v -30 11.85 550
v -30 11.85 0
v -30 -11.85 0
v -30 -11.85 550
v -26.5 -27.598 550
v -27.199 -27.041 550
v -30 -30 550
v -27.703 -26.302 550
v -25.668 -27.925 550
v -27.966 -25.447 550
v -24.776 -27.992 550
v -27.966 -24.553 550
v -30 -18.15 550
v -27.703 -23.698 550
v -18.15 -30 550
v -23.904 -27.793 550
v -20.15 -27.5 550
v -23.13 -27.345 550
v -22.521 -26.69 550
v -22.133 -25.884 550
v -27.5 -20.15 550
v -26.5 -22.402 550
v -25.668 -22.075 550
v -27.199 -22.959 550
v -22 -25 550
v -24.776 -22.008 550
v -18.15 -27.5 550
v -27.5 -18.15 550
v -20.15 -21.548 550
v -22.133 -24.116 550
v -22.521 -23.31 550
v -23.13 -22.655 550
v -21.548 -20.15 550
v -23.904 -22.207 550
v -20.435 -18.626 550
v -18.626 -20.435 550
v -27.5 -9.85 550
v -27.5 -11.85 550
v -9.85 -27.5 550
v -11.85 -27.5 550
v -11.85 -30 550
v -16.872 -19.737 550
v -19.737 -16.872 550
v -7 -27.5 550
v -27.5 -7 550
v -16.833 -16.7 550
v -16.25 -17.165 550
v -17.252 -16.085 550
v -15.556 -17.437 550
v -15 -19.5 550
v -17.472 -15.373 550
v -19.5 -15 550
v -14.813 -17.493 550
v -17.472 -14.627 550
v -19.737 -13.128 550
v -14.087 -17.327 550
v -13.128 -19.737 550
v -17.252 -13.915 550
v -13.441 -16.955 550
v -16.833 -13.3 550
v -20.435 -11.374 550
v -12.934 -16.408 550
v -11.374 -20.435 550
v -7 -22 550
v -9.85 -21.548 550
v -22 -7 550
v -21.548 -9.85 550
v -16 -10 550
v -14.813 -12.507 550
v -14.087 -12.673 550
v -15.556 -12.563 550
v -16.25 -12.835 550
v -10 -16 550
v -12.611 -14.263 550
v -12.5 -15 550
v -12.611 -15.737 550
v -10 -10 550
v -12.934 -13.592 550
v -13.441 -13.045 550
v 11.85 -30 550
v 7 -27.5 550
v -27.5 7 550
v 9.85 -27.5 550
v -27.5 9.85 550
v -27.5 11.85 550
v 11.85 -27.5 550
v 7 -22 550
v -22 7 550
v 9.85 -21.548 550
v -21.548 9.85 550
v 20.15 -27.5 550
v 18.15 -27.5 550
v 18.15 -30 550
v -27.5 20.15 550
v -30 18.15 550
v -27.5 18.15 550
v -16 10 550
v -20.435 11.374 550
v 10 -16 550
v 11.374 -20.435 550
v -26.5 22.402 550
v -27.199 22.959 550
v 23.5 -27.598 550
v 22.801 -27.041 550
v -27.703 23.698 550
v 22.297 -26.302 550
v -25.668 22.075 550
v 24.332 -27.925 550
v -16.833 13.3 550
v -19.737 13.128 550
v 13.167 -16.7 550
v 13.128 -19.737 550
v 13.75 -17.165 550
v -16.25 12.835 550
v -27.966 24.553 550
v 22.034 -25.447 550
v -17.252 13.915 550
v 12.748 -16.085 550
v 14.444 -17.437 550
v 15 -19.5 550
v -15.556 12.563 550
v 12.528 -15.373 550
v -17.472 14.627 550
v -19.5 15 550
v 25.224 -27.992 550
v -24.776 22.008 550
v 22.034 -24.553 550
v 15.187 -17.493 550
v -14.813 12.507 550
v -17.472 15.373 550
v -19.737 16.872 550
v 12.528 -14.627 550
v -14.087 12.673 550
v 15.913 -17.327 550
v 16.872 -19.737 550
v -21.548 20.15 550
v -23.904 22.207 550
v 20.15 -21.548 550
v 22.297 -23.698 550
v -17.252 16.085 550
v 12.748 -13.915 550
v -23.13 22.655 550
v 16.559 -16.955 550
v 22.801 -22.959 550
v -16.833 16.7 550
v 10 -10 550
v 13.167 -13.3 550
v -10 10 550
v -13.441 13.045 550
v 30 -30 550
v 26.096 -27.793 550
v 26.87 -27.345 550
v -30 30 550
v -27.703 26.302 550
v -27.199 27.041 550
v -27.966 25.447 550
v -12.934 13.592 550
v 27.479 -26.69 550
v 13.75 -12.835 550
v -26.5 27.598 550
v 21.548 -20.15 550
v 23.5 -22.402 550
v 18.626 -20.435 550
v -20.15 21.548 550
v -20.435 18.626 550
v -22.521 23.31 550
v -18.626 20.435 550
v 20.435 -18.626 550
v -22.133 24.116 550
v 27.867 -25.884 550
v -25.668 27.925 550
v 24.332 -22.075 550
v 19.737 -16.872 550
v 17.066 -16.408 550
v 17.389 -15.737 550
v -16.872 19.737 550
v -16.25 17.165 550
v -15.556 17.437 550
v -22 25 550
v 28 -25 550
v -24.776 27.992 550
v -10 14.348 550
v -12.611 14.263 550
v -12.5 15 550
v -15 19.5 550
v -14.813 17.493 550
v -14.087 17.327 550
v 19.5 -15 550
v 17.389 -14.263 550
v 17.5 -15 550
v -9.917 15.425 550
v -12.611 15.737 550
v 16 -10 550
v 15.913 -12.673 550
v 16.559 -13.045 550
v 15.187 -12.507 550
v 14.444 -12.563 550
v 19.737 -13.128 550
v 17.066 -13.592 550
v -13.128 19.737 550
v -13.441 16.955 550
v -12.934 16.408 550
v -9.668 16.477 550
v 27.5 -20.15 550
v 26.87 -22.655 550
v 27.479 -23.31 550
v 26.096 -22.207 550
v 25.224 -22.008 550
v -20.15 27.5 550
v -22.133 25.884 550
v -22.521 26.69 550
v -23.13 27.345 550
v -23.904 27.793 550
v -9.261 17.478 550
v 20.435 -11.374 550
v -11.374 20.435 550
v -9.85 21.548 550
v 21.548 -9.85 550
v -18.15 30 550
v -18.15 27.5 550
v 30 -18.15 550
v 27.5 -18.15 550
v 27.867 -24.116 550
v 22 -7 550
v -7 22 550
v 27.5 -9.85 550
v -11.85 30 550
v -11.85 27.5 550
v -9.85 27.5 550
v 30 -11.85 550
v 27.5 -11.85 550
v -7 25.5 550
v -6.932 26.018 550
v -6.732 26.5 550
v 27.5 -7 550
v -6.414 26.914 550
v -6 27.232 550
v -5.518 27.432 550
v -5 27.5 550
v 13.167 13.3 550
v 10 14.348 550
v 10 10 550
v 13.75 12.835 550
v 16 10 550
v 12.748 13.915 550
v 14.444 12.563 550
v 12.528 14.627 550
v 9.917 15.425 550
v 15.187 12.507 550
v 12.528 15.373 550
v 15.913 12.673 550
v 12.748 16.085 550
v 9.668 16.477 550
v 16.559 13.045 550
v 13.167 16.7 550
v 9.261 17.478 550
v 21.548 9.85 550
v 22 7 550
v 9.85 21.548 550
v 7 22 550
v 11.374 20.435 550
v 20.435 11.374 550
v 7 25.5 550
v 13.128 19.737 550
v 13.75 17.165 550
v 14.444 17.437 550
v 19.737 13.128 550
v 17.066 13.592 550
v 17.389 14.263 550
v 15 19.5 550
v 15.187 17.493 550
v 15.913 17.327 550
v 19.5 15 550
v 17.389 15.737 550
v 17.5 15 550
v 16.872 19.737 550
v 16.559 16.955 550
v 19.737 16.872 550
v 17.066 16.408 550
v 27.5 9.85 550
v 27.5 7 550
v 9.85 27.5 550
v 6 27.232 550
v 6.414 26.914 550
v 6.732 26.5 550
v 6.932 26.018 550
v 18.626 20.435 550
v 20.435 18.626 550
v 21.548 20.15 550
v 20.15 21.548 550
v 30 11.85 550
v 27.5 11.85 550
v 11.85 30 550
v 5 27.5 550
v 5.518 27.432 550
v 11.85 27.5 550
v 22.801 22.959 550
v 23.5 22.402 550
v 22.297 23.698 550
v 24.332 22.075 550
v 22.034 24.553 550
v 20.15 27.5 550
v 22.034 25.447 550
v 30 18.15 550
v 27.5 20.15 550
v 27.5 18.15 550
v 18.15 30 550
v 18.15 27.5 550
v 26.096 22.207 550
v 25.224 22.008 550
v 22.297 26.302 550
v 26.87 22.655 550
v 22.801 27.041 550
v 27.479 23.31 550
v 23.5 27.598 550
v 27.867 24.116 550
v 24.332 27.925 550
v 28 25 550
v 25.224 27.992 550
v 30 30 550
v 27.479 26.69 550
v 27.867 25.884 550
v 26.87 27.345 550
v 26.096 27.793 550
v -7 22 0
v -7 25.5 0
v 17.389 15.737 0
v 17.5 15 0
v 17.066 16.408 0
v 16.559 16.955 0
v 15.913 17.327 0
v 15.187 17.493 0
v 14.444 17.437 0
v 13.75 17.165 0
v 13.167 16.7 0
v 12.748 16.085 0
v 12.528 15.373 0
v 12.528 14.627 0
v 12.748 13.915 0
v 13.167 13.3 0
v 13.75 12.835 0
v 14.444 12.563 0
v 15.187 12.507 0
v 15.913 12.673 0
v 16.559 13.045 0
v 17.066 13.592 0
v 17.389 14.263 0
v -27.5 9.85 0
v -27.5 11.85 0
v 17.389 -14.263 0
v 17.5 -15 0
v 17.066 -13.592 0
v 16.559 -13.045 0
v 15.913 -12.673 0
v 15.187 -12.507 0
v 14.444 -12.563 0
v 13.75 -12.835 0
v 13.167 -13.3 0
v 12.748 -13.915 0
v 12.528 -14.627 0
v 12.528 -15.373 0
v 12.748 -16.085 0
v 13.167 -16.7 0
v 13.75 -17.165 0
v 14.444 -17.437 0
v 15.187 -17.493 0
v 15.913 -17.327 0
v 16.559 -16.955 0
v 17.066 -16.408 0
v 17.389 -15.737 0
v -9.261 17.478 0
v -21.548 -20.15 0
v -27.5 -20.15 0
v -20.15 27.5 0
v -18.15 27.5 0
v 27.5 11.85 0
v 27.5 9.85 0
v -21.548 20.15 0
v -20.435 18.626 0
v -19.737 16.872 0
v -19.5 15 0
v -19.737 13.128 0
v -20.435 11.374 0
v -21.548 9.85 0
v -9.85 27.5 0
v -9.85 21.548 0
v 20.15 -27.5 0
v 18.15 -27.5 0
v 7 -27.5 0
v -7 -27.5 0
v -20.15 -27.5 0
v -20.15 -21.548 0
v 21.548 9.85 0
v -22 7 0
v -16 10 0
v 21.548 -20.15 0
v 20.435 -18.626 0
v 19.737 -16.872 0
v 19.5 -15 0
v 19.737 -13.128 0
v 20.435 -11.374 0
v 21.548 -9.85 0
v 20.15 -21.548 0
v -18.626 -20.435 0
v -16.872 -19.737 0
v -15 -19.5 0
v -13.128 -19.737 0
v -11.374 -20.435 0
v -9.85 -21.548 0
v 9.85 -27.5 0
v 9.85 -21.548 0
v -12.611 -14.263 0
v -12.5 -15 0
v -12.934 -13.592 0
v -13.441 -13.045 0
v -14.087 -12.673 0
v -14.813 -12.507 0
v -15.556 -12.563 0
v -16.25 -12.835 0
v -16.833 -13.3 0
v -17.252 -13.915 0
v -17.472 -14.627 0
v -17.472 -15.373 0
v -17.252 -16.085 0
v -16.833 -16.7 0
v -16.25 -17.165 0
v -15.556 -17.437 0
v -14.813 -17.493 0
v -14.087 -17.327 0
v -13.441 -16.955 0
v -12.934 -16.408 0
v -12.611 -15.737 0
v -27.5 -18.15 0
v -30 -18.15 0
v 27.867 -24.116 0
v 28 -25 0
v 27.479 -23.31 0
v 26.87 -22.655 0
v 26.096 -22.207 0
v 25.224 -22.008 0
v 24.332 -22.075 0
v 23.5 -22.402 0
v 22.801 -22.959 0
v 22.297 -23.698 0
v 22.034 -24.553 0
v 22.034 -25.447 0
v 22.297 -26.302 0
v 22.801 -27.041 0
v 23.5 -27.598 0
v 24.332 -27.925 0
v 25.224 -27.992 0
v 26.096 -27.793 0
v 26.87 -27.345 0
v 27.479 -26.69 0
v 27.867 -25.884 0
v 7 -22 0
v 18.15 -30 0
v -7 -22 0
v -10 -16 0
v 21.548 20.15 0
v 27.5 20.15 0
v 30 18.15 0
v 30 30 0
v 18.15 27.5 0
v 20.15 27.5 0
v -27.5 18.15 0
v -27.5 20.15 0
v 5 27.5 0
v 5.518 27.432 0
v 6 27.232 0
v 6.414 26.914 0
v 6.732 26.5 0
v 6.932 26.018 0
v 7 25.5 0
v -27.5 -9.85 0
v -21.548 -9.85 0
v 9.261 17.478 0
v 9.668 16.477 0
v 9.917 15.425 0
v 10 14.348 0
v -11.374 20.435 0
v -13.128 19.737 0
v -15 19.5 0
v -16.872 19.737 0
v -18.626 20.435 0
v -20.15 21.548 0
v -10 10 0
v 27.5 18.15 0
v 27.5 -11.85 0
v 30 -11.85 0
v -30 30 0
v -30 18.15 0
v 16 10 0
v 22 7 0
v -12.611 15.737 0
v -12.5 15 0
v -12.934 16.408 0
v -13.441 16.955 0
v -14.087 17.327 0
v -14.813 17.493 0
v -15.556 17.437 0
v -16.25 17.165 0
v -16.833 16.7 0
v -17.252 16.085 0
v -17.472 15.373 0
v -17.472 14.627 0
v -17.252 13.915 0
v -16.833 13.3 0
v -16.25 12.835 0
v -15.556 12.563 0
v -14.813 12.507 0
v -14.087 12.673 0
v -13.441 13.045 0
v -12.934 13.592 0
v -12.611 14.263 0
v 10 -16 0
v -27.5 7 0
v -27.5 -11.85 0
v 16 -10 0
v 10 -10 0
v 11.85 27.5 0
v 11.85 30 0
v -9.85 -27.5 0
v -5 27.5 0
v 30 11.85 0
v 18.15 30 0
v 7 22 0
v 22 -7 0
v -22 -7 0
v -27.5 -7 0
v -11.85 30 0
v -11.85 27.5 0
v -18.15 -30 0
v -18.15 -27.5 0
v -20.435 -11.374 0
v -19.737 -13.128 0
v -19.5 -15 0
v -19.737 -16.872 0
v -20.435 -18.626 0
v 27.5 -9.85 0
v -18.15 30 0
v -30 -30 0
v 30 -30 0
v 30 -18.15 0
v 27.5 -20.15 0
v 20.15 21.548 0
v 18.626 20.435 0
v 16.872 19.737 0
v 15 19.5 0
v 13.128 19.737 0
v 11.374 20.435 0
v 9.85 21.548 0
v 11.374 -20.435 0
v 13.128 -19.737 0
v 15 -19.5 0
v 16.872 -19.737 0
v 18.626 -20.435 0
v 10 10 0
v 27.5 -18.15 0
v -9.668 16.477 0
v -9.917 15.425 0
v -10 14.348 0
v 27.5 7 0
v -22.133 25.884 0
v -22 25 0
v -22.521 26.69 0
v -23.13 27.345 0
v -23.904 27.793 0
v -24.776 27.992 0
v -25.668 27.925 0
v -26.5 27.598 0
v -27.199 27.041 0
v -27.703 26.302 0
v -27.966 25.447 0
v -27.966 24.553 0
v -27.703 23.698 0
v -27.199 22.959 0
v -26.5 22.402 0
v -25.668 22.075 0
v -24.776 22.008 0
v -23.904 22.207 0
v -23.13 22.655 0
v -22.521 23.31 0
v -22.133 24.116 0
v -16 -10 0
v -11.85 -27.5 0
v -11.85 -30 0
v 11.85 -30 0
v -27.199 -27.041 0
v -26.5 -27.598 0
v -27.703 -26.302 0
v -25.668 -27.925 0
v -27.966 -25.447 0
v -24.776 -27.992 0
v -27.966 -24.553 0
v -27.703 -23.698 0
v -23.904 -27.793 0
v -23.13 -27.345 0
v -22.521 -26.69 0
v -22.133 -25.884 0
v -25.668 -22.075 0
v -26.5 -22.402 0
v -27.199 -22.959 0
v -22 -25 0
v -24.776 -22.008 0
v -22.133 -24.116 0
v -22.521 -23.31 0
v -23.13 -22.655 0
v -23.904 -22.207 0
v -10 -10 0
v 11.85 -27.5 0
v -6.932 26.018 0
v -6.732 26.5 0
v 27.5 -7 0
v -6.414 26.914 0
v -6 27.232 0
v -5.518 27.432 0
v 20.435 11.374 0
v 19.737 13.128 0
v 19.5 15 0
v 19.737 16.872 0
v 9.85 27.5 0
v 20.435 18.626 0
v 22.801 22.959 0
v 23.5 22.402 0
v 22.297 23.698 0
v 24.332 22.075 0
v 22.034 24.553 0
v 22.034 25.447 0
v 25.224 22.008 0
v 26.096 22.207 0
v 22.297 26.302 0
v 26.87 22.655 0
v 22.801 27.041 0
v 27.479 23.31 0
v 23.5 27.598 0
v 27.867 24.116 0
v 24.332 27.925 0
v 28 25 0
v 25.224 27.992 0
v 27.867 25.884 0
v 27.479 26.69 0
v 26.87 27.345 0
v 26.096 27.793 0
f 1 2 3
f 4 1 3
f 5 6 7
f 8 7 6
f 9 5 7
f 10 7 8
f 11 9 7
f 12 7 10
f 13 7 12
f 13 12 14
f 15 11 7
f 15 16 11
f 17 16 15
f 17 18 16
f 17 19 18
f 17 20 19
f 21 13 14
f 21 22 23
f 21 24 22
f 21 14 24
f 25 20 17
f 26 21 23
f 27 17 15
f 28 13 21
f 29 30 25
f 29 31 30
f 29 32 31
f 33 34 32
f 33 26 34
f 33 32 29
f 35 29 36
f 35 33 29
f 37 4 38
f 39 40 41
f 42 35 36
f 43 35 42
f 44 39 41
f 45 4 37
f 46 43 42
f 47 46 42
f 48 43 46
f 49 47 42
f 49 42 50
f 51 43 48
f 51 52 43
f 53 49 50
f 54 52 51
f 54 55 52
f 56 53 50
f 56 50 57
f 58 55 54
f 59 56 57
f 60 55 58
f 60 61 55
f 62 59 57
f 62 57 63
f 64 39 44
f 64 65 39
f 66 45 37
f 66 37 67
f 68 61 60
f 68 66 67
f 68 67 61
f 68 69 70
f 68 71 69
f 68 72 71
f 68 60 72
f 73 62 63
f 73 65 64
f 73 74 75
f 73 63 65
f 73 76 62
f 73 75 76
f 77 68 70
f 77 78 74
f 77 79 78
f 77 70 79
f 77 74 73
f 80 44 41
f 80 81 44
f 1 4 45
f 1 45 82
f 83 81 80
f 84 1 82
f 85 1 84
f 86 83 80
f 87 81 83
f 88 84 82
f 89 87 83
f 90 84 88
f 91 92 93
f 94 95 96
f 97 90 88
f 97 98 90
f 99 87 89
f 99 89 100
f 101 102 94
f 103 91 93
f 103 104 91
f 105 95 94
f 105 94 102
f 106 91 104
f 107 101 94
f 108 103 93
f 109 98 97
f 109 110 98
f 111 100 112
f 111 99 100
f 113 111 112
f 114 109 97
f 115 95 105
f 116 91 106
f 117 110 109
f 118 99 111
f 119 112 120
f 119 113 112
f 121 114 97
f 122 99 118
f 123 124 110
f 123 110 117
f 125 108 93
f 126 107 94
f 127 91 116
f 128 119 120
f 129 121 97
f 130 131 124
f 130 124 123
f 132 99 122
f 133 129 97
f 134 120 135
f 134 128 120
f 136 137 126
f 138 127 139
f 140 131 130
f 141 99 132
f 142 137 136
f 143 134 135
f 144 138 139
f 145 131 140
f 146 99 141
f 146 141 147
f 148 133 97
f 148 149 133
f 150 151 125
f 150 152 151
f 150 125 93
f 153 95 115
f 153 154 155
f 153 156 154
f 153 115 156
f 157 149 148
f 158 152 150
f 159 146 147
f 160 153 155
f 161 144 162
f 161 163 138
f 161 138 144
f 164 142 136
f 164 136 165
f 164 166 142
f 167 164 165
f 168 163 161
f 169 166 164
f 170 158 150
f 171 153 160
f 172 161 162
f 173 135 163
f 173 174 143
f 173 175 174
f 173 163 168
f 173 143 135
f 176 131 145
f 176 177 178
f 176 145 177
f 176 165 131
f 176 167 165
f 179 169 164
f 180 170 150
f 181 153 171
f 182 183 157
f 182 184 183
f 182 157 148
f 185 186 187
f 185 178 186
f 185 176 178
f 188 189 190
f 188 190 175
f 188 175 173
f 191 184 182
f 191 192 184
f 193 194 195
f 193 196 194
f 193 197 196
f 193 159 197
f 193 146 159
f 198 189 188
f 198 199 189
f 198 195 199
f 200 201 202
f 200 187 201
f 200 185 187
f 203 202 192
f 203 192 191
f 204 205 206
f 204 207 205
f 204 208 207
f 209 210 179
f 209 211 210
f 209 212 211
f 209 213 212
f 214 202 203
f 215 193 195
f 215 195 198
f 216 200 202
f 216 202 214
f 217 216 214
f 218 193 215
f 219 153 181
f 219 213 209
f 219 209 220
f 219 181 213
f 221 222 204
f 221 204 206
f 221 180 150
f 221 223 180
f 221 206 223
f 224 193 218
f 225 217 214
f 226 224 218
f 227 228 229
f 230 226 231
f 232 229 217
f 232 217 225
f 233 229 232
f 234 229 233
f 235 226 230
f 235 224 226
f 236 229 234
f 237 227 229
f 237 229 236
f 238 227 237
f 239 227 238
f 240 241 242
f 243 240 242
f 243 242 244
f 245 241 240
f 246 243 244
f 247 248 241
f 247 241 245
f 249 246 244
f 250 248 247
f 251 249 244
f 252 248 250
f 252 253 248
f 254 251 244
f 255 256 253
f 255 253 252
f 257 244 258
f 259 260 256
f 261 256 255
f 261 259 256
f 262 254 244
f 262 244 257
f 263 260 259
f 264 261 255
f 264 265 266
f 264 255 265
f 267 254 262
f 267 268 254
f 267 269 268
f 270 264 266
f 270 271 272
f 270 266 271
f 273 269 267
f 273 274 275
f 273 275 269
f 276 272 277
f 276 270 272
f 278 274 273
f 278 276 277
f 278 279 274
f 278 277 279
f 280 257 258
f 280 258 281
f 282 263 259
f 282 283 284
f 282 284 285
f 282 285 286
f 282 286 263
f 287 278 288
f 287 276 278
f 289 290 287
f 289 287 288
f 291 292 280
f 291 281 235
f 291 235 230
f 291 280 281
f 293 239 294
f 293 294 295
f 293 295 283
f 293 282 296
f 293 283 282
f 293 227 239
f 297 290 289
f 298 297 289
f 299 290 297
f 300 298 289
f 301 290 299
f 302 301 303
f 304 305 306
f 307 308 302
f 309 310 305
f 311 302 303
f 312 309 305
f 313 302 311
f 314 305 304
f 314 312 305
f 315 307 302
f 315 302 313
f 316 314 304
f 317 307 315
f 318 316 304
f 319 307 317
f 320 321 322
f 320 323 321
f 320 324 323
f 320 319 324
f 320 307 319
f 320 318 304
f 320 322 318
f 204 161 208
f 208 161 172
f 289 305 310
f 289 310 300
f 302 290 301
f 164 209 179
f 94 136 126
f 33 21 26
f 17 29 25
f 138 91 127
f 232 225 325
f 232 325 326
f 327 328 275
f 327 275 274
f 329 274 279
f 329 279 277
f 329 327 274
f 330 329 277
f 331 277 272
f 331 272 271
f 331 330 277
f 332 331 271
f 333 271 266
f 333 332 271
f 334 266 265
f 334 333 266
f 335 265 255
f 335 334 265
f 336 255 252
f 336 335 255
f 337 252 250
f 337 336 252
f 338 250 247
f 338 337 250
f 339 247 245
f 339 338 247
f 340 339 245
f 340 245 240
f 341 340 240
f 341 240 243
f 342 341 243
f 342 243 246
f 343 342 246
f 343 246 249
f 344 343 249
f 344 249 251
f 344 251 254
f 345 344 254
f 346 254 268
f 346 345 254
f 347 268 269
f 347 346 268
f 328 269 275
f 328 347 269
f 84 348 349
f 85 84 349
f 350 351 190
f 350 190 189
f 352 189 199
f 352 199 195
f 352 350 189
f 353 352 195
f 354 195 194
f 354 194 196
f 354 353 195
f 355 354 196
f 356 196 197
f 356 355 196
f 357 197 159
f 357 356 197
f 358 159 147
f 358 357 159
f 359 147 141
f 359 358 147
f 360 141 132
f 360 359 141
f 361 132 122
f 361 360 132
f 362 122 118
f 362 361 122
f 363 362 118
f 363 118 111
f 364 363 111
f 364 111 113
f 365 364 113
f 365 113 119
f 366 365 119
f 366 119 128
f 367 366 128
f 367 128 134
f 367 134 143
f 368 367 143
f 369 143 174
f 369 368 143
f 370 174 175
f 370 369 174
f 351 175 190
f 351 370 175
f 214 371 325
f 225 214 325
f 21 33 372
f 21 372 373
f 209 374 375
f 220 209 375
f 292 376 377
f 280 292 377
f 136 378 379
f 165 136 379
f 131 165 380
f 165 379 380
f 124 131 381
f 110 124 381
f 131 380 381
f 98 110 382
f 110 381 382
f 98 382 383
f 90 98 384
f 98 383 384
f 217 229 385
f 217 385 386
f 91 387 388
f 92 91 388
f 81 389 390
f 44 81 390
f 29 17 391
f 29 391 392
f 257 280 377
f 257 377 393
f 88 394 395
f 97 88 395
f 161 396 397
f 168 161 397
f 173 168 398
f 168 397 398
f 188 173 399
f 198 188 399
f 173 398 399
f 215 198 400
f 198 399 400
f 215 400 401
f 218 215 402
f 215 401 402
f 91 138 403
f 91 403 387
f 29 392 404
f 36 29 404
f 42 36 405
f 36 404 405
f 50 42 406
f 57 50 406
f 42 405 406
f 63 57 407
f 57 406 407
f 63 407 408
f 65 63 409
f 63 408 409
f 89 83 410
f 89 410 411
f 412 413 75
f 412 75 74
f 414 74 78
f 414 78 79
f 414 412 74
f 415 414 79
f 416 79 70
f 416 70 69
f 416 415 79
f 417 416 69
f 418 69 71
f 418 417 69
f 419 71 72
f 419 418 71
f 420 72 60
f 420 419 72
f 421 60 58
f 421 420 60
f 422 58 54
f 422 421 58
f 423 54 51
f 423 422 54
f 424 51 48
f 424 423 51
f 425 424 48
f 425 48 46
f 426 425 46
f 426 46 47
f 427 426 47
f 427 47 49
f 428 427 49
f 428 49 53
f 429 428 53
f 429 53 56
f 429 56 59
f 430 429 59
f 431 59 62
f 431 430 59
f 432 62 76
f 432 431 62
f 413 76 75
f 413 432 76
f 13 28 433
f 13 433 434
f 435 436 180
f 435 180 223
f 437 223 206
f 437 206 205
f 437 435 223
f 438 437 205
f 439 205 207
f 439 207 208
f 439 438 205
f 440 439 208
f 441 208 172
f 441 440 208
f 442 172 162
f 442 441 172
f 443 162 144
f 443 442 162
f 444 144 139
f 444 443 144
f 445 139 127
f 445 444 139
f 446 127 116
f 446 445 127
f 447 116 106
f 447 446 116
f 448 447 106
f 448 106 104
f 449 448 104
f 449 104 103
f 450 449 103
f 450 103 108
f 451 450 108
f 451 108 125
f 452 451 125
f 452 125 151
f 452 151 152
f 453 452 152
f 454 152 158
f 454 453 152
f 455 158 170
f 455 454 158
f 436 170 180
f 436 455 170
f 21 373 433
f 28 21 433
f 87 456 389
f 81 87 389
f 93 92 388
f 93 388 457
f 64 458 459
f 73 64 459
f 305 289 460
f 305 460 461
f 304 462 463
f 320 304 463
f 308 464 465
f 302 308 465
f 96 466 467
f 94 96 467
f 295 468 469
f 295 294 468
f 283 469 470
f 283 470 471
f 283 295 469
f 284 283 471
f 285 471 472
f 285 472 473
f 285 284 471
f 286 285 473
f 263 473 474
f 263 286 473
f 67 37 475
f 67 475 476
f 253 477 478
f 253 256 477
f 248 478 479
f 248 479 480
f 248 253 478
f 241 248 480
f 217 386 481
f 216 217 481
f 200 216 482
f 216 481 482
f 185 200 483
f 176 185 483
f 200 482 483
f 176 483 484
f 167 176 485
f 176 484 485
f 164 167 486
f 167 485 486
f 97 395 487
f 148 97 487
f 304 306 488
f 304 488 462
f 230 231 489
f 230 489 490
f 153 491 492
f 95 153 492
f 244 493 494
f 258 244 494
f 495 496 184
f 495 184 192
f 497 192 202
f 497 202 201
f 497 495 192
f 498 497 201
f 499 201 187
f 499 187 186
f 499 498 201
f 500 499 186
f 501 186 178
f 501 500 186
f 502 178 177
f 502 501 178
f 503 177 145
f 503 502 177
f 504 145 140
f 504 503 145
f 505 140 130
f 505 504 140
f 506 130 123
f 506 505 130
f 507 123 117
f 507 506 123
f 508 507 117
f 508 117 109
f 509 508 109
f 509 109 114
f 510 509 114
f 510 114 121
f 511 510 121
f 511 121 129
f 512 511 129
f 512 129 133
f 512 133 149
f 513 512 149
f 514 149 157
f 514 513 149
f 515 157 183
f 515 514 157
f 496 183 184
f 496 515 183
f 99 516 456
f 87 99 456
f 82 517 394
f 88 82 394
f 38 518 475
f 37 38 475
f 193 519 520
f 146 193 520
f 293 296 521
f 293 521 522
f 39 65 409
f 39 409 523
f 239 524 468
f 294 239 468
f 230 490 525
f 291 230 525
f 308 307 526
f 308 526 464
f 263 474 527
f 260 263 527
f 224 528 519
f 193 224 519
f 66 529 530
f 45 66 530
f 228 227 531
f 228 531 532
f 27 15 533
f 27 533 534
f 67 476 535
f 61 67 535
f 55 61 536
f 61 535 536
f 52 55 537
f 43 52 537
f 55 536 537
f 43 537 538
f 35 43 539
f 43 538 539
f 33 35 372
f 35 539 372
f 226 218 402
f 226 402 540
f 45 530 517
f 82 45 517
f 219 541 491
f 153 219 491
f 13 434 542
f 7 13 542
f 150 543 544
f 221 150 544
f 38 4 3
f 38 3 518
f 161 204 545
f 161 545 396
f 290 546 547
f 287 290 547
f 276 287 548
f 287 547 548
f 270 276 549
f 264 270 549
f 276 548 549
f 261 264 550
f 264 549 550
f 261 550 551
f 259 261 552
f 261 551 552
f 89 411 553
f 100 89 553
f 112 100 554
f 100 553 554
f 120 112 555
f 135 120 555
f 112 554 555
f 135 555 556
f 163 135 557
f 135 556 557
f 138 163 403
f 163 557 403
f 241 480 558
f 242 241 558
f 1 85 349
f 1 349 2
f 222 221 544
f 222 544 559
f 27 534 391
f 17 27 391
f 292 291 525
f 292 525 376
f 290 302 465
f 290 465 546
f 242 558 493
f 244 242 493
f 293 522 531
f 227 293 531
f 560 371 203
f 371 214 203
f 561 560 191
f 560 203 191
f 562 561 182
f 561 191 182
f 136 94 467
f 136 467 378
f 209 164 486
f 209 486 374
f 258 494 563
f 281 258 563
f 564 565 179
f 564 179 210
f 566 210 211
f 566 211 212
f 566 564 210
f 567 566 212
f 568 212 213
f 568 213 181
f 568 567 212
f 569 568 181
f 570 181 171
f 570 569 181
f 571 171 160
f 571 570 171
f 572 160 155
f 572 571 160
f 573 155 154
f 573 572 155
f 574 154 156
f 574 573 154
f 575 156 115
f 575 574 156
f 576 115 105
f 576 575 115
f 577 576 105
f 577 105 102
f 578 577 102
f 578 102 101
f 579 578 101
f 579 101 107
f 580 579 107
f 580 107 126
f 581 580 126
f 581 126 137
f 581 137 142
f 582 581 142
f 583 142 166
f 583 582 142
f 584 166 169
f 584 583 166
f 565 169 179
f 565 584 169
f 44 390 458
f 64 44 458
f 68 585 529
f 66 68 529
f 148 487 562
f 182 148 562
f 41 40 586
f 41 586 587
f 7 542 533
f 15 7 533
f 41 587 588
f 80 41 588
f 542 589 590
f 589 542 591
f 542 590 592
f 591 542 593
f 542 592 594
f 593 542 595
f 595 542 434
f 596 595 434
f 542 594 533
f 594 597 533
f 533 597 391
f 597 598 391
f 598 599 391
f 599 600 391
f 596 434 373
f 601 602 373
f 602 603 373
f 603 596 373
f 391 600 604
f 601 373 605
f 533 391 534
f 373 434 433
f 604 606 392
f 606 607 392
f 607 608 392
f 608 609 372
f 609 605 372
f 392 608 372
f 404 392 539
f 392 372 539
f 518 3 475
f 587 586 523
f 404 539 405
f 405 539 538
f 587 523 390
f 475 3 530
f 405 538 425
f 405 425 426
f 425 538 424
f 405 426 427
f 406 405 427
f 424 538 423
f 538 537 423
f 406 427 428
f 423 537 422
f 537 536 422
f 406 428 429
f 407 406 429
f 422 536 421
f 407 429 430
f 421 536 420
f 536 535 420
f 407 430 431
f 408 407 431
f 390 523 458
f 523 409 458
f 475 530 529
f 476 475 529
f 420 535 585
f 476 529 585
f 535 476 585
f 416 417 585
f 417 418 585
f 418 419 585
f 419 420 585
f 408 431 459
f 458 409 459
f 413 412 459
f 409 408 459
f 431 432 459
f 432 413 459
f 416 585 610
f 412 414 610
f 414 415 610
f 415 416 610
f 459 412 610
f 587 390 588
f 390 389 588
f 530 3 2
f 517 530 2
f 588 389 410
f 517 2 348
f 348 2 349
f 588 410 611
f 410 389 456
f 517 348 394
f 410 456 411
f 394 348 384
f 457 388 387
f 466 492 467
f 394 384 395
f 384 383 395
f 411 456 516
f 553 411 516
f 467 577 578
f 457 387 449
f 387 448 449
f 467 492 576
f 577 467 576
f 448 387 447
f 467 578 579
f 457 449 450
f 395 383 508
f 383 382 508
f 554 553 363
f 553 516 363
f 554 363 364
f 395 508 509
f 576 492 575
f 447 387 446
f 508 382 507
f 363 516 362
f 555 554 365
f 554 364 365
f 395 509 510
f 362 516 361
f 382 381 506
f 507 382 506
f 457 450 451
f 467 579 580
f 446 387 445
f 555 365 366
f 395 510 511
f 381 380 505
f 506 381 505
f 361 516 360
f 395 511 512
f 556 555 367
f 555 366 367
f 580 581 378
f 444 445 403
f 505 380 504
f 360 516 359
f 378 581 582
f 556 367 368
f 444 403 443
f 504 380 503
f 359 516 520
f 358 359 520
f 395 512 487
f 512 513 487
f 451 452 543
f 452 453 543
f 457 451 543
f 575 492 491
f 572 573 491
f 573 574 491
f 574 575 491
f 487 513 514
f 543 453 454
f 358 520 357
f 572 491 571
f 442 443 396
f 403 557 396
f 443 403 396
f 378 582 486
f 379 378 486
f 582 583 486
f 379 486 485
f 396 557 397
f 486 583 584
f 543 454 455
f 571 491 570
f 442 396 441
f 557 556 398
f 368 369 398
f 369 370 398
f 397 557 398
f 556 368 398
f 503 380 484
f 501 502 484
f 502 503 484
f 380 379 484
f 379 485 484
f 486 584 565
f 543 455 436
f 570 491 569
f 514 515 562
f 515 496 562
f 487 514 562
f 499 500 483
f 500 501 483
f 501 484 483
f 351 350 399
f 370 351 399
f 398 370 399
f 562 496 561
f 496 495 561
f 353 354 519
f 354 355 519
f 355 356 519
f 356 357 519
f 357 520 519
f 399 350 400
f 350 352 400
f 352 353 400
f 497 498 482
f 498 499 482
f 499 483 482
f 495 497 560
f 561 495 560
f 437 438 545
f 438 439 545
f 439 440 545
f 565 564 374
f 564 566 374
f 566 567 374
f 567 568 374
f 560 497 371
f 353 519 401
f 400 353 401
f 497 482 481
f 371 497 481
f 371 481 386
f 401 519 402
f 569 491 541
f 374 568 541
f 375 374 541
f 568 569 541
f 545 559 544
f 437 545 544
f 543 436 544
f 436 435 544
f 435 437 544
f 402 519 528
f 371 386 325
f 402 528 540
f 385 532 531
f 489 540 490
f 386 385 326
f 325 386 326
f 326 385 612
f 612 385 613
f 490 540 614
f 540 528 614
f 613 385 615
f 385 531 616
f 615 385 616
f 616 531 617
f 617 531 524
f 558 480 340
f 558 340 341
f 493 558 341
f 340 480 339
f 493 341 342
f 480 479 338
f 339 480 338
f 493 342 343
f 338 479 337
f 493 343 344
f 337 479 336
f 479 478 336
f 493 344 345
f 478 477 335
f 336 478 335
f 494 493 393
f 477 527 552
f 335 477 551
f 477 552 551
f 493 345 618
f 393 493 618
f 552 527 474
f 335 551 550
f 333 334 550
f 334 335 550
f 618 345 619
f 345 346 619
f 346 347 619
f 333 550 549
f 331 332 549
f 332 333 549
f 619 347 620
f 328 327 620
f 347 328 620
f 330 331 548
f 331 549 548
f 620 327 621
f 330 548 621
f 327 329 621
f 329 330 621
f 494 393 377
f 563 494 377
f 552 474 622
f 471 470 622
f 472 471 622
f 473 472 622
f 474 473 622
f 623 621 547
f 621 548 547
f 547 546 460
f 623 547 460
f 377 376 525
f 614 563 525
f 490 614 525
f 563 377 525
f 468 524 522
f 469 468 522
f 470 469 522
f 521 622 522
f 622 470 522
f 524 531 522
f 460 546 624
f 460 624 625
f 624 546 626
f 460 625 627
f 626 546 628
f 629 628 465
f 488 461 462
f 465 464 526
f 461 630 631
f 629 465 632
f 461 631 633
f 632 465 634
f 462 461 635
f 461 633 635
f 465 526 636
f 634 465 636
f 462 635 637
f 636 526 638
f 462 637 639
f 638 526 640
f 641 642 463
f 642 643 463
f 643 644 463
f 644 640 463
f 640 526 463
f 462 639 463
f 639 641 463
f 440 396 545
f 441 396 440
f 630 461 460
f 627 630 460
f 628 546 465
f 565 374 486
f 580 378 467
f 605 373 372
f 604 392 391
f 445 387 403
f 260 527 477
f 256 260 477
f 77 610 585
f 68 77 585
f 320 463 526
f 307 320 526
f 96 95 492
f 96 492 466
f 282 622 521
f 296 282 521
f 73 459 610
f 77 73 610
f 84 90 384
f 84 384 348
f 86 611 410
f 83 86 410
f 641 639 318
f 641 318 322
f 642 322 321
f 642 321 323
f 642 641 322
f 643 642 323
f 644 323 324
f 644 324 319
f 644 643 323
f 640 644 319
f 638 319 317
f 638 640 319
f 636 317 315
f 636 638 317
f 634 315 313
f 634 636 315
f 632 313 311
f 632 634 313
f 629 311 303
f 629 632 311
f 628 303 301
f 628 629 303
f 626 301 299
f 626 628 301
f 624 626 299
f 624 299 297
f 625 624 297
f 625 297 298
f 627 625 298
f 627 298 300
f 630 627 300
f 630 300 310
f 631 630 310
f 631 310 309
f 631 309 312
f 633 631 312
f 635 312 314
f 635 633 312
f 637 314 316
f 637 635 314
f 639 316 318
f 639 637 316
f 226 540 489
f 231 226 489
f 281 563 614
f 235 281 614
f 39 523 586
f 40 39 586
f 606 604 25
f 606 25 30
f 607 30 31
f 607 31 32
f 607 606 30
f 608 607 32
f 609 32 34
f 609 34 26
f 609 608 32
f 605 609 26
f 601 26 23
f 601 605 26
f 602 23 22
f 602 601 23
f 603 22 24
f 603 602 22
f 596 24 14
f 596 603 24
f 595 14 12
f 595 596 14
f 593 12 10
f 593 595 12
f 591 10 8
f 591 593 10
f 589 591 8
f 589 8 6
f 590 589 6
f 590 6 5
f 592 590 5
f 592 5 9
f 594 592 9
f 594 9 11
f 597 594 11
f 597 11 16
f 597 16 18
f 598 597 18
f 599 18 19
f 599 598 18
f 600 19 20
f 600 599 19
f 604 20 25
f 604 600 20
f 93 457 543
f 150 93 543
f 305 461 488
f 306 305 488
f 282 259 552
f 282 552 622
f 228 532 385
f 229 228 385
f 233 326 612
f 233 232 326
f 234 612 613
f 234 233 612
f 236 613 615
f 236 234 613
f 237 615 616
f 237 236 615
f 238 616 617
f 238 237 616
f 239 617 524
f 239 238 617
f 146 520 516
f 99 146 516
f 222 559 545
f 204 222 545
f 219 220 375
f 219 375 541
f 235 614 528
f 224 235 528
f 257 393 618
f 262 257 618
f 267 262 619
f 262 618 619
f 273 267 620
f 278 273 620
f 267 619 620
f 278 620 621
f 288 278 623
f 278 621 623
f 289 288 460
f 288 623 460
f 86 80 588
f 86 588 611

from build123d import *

# Parameters (mm, degrees)
F0_R     = 3
F0_R_2   = 2.5
F1_DEPTH = 550
F2_R     = 2
F3_R     = 7


# Not quite as in the source:
# - a feature names something its author has since deleted; it is built from what else it names


with BuildPart() as f1:
    # F0 (on Top) → F1 (new body)
    with BuildSketch(Plane.XY):
        with BuildLine():
            Line((18.15, -30), (30, -30))
            Line((30, -30), (30, -18.15))
            Line((30, -18.15), (27.5, -18.15))
            Line((27.5, -18.15), (27.5, -20.15))
            Line((27.5, -20.15), (21.5477069044, -20.15))
            ThreePointArc((21.5477069044, -20.15), (19.5, -15), (21.5477069044, -9.85))
            Line((21.5477069044, -9.85), (27.5, -9.85))
            Line((27.5, -9.85), (27.5, -11.85))
            Line((27.5, -11.85), (30, -11.85))
            Line((30, -11.85), (30, 11.85))
            Line((30, 11.85), (27.5, 11.85))
            Line((27.5, 11.85), (27.5, 9.85))
            Line((27.5, 9.85), (21.5477069044, 9.85))
            ThreePointArc((21.5477069044, 9.85), (19.5, 15), (21.5477069044, 20.15))
            Line((21.5477069044, 20.15), (27.5, 20.15))
            Line((27.5, 20.15), (27.5, 18.15))
            Line((27.5, 18.15), (30, 18.15))
            Line((30, 18.15), (30, 30))
            Line((30, 30), (18.15, 30))
            Line((18.15, 30), (18.15, 27.5))
            Line((18.15, 27.5), (20.15, 27.5))
            Line((20.15, 27.5), (20.15, 21.5477069044))
            ThreePointArc((20.15, 21.5477069044), (15, 19.5), (9.85, 21.5477069044))
            Line((9.85, 21.5477069044), (9.85, 27.5))
            Line((9.85, 27.5), (11.85, 27.5))
            Line((11.85, 27.5), (11.85, 30))
            Line((11.85, 30), (-11.85, 30))
            Line((-11.85, 30), (-11.85, 27.5))
            Line((-11.85, 27.5), (-9.85, 27.5))
            Line((-9.85, 27.5), (-9.85, 21.5477069044))
            ThreePointArc((-9.85, 21.5477069044), (-15, 19.5), (-20.15, 21.5477069044))
            Line((-20.15, 21.5477069044), (-20.15, 27.5))
            Line((-20.15, 27.5), (-18.15, 27.5))
            Line((-18.15, 27.5), (-18.15, 30))
            Line((-18.15, 30), (-30, 30))
            Line((-30, 30), (-30, 18.15))
            Line((-30, 18.15), (-27.5, 18.15))
            Line((-27.5, 18.15), (-27.5, 20.15))
            Line((-27.5, 20.15), (-21.5477069044, 20.15))
            ThreePointArc((-21.5477069044, 20.15), (-19.5, 15), (-21.5477069044, 9.85))
            Line((-21.5477069044, 9.85), (-27.5, 9.85))
            Line((-27.5, 9.85), (-27.5, 11.85))
            Line((-27.5, 11.85), (-30, 11.85))
            Line((-30, 11.85), (-30, -11.85))
            Line((-30, -11.85), (-27.5, -11.85))
            Line((-27.5, -11.85), (-27.5, -9.85))
            Line((-27.5, -9.85), (-21.5477069044, -9.85))
            ThreePointArc((-21.5477069044, -9.85), (-19.5, -15), (-21.5477069044, -20.15))
            Line((-21.5477069044, -20.15), (-27.5, -20.15))
            Line((-27.5, -20.15), (-27.5, -18.15))
            Line((-27.5, -18.15), (-30, -18.15))
            Line((-30, -18.15), (-30, -30))
            Line((-30, -30), (-18.15, -30))
            Line((-18.15, -30), (-18.15, -27.5))
            Line((-18.15, -27.5), (-20.15, -27.5))
            Line((-20.15, -27.5), (-20.15, -21.5477069044))
            ThreePointArc((-20.15, -21.5477069044), (-15, -19.5), (-9.85, -21.5477069044))
            Line((-9.85, -21.5477069044), (-9.85, -27.5))
            Line((-9.85, -27.5), (-11.85, -27.5))
            Line((-11.85, -27.5), (-11.85, -30))
            Line((-11.85, -30), (11.85, -30))
            Line((11.85, -30), (11.85, -27.5))
            Line((11.85, -27.5), (9.85, -27.5))
            Line((9.85, -27.5), (9.85, -21.5477069044))
            ThreePointArc((9.85, -21.5477069044), (15, -19.5), (20.15, -21.5477069044))
            Line((20.15, -21.5477069044), (20.15, -27.5))
            Line((20.15, -27.5), (18.15, -27.5))
            Line((18.15, -27.5), (18.15, -30))
        make_face()
        with Locations((-25, -25)):
            Circle(F0_R, mode=Mode.SUBTRACT)
        with Locations((-15, -15)):
            Circle(F0_R_2, mode=Mode.SUBTRACT)
        with Locations((25, -25)):
            Circle(F0_R, mode=Mode.SUBTRACT)
        with Locations((15, -15)):
            Circle(F0_R_2, mode=Mode.SUBTRACT)
        with Locations((-25, 25)):
            Circle(F0_R, mode=Mode.SUBTRACT)
        with Locations((-15, 15)):
            Circle(F0_R_2, mode=Mode.SUBTRACT)
        Polygon((-7, 22), (-7, 27.5), (0, 27.5), (7, 27.5), (7, 22), (10, 16), (10, 10), (16, 10), (22, 7), (27.5, 7), (27.5, 0), (27.5, -7), (22, -7), (16, -10), (10, -10), (10, -16), (7, -22), (7, -27.5), (0, -27.5), (-7, -27.5), (-7, -22), (-10, -16), (-10, -10), (-16, -10), (-22, -7), (-27.5, -7), (-27.5, 0), (-27.5, 7), (-22, 7), (-16, 10), (-10, 10), (-10, 16), align=None, mode=Mode.SUBTRACT)
        with Locations((15, 15)):
            Circle(F0_R_2, mode=Mode.SUBTRACT)
        with Locations((25, 25)):
            Circle(F0_R, mode=Mode.SUBTRACT)
    extrude(amount=F1_DEPTH)

    # F2
    f2_edges = [f1.edges().sort_by_distance(p)[0] for p in [
        (-7, 27.5, 275),
        (7, 27.5, 275),
    ]]
    fillet(f2_edges, radius=F2_R)

    # F3
    f3_edges = [f1.edges().sort_by_distance(p)[0] for p in [
        (-10, 16, 275),
        (10, 16, 275),
    ]]
    fillet(f3_edges, radius=F3_R)


solid = f1.part
